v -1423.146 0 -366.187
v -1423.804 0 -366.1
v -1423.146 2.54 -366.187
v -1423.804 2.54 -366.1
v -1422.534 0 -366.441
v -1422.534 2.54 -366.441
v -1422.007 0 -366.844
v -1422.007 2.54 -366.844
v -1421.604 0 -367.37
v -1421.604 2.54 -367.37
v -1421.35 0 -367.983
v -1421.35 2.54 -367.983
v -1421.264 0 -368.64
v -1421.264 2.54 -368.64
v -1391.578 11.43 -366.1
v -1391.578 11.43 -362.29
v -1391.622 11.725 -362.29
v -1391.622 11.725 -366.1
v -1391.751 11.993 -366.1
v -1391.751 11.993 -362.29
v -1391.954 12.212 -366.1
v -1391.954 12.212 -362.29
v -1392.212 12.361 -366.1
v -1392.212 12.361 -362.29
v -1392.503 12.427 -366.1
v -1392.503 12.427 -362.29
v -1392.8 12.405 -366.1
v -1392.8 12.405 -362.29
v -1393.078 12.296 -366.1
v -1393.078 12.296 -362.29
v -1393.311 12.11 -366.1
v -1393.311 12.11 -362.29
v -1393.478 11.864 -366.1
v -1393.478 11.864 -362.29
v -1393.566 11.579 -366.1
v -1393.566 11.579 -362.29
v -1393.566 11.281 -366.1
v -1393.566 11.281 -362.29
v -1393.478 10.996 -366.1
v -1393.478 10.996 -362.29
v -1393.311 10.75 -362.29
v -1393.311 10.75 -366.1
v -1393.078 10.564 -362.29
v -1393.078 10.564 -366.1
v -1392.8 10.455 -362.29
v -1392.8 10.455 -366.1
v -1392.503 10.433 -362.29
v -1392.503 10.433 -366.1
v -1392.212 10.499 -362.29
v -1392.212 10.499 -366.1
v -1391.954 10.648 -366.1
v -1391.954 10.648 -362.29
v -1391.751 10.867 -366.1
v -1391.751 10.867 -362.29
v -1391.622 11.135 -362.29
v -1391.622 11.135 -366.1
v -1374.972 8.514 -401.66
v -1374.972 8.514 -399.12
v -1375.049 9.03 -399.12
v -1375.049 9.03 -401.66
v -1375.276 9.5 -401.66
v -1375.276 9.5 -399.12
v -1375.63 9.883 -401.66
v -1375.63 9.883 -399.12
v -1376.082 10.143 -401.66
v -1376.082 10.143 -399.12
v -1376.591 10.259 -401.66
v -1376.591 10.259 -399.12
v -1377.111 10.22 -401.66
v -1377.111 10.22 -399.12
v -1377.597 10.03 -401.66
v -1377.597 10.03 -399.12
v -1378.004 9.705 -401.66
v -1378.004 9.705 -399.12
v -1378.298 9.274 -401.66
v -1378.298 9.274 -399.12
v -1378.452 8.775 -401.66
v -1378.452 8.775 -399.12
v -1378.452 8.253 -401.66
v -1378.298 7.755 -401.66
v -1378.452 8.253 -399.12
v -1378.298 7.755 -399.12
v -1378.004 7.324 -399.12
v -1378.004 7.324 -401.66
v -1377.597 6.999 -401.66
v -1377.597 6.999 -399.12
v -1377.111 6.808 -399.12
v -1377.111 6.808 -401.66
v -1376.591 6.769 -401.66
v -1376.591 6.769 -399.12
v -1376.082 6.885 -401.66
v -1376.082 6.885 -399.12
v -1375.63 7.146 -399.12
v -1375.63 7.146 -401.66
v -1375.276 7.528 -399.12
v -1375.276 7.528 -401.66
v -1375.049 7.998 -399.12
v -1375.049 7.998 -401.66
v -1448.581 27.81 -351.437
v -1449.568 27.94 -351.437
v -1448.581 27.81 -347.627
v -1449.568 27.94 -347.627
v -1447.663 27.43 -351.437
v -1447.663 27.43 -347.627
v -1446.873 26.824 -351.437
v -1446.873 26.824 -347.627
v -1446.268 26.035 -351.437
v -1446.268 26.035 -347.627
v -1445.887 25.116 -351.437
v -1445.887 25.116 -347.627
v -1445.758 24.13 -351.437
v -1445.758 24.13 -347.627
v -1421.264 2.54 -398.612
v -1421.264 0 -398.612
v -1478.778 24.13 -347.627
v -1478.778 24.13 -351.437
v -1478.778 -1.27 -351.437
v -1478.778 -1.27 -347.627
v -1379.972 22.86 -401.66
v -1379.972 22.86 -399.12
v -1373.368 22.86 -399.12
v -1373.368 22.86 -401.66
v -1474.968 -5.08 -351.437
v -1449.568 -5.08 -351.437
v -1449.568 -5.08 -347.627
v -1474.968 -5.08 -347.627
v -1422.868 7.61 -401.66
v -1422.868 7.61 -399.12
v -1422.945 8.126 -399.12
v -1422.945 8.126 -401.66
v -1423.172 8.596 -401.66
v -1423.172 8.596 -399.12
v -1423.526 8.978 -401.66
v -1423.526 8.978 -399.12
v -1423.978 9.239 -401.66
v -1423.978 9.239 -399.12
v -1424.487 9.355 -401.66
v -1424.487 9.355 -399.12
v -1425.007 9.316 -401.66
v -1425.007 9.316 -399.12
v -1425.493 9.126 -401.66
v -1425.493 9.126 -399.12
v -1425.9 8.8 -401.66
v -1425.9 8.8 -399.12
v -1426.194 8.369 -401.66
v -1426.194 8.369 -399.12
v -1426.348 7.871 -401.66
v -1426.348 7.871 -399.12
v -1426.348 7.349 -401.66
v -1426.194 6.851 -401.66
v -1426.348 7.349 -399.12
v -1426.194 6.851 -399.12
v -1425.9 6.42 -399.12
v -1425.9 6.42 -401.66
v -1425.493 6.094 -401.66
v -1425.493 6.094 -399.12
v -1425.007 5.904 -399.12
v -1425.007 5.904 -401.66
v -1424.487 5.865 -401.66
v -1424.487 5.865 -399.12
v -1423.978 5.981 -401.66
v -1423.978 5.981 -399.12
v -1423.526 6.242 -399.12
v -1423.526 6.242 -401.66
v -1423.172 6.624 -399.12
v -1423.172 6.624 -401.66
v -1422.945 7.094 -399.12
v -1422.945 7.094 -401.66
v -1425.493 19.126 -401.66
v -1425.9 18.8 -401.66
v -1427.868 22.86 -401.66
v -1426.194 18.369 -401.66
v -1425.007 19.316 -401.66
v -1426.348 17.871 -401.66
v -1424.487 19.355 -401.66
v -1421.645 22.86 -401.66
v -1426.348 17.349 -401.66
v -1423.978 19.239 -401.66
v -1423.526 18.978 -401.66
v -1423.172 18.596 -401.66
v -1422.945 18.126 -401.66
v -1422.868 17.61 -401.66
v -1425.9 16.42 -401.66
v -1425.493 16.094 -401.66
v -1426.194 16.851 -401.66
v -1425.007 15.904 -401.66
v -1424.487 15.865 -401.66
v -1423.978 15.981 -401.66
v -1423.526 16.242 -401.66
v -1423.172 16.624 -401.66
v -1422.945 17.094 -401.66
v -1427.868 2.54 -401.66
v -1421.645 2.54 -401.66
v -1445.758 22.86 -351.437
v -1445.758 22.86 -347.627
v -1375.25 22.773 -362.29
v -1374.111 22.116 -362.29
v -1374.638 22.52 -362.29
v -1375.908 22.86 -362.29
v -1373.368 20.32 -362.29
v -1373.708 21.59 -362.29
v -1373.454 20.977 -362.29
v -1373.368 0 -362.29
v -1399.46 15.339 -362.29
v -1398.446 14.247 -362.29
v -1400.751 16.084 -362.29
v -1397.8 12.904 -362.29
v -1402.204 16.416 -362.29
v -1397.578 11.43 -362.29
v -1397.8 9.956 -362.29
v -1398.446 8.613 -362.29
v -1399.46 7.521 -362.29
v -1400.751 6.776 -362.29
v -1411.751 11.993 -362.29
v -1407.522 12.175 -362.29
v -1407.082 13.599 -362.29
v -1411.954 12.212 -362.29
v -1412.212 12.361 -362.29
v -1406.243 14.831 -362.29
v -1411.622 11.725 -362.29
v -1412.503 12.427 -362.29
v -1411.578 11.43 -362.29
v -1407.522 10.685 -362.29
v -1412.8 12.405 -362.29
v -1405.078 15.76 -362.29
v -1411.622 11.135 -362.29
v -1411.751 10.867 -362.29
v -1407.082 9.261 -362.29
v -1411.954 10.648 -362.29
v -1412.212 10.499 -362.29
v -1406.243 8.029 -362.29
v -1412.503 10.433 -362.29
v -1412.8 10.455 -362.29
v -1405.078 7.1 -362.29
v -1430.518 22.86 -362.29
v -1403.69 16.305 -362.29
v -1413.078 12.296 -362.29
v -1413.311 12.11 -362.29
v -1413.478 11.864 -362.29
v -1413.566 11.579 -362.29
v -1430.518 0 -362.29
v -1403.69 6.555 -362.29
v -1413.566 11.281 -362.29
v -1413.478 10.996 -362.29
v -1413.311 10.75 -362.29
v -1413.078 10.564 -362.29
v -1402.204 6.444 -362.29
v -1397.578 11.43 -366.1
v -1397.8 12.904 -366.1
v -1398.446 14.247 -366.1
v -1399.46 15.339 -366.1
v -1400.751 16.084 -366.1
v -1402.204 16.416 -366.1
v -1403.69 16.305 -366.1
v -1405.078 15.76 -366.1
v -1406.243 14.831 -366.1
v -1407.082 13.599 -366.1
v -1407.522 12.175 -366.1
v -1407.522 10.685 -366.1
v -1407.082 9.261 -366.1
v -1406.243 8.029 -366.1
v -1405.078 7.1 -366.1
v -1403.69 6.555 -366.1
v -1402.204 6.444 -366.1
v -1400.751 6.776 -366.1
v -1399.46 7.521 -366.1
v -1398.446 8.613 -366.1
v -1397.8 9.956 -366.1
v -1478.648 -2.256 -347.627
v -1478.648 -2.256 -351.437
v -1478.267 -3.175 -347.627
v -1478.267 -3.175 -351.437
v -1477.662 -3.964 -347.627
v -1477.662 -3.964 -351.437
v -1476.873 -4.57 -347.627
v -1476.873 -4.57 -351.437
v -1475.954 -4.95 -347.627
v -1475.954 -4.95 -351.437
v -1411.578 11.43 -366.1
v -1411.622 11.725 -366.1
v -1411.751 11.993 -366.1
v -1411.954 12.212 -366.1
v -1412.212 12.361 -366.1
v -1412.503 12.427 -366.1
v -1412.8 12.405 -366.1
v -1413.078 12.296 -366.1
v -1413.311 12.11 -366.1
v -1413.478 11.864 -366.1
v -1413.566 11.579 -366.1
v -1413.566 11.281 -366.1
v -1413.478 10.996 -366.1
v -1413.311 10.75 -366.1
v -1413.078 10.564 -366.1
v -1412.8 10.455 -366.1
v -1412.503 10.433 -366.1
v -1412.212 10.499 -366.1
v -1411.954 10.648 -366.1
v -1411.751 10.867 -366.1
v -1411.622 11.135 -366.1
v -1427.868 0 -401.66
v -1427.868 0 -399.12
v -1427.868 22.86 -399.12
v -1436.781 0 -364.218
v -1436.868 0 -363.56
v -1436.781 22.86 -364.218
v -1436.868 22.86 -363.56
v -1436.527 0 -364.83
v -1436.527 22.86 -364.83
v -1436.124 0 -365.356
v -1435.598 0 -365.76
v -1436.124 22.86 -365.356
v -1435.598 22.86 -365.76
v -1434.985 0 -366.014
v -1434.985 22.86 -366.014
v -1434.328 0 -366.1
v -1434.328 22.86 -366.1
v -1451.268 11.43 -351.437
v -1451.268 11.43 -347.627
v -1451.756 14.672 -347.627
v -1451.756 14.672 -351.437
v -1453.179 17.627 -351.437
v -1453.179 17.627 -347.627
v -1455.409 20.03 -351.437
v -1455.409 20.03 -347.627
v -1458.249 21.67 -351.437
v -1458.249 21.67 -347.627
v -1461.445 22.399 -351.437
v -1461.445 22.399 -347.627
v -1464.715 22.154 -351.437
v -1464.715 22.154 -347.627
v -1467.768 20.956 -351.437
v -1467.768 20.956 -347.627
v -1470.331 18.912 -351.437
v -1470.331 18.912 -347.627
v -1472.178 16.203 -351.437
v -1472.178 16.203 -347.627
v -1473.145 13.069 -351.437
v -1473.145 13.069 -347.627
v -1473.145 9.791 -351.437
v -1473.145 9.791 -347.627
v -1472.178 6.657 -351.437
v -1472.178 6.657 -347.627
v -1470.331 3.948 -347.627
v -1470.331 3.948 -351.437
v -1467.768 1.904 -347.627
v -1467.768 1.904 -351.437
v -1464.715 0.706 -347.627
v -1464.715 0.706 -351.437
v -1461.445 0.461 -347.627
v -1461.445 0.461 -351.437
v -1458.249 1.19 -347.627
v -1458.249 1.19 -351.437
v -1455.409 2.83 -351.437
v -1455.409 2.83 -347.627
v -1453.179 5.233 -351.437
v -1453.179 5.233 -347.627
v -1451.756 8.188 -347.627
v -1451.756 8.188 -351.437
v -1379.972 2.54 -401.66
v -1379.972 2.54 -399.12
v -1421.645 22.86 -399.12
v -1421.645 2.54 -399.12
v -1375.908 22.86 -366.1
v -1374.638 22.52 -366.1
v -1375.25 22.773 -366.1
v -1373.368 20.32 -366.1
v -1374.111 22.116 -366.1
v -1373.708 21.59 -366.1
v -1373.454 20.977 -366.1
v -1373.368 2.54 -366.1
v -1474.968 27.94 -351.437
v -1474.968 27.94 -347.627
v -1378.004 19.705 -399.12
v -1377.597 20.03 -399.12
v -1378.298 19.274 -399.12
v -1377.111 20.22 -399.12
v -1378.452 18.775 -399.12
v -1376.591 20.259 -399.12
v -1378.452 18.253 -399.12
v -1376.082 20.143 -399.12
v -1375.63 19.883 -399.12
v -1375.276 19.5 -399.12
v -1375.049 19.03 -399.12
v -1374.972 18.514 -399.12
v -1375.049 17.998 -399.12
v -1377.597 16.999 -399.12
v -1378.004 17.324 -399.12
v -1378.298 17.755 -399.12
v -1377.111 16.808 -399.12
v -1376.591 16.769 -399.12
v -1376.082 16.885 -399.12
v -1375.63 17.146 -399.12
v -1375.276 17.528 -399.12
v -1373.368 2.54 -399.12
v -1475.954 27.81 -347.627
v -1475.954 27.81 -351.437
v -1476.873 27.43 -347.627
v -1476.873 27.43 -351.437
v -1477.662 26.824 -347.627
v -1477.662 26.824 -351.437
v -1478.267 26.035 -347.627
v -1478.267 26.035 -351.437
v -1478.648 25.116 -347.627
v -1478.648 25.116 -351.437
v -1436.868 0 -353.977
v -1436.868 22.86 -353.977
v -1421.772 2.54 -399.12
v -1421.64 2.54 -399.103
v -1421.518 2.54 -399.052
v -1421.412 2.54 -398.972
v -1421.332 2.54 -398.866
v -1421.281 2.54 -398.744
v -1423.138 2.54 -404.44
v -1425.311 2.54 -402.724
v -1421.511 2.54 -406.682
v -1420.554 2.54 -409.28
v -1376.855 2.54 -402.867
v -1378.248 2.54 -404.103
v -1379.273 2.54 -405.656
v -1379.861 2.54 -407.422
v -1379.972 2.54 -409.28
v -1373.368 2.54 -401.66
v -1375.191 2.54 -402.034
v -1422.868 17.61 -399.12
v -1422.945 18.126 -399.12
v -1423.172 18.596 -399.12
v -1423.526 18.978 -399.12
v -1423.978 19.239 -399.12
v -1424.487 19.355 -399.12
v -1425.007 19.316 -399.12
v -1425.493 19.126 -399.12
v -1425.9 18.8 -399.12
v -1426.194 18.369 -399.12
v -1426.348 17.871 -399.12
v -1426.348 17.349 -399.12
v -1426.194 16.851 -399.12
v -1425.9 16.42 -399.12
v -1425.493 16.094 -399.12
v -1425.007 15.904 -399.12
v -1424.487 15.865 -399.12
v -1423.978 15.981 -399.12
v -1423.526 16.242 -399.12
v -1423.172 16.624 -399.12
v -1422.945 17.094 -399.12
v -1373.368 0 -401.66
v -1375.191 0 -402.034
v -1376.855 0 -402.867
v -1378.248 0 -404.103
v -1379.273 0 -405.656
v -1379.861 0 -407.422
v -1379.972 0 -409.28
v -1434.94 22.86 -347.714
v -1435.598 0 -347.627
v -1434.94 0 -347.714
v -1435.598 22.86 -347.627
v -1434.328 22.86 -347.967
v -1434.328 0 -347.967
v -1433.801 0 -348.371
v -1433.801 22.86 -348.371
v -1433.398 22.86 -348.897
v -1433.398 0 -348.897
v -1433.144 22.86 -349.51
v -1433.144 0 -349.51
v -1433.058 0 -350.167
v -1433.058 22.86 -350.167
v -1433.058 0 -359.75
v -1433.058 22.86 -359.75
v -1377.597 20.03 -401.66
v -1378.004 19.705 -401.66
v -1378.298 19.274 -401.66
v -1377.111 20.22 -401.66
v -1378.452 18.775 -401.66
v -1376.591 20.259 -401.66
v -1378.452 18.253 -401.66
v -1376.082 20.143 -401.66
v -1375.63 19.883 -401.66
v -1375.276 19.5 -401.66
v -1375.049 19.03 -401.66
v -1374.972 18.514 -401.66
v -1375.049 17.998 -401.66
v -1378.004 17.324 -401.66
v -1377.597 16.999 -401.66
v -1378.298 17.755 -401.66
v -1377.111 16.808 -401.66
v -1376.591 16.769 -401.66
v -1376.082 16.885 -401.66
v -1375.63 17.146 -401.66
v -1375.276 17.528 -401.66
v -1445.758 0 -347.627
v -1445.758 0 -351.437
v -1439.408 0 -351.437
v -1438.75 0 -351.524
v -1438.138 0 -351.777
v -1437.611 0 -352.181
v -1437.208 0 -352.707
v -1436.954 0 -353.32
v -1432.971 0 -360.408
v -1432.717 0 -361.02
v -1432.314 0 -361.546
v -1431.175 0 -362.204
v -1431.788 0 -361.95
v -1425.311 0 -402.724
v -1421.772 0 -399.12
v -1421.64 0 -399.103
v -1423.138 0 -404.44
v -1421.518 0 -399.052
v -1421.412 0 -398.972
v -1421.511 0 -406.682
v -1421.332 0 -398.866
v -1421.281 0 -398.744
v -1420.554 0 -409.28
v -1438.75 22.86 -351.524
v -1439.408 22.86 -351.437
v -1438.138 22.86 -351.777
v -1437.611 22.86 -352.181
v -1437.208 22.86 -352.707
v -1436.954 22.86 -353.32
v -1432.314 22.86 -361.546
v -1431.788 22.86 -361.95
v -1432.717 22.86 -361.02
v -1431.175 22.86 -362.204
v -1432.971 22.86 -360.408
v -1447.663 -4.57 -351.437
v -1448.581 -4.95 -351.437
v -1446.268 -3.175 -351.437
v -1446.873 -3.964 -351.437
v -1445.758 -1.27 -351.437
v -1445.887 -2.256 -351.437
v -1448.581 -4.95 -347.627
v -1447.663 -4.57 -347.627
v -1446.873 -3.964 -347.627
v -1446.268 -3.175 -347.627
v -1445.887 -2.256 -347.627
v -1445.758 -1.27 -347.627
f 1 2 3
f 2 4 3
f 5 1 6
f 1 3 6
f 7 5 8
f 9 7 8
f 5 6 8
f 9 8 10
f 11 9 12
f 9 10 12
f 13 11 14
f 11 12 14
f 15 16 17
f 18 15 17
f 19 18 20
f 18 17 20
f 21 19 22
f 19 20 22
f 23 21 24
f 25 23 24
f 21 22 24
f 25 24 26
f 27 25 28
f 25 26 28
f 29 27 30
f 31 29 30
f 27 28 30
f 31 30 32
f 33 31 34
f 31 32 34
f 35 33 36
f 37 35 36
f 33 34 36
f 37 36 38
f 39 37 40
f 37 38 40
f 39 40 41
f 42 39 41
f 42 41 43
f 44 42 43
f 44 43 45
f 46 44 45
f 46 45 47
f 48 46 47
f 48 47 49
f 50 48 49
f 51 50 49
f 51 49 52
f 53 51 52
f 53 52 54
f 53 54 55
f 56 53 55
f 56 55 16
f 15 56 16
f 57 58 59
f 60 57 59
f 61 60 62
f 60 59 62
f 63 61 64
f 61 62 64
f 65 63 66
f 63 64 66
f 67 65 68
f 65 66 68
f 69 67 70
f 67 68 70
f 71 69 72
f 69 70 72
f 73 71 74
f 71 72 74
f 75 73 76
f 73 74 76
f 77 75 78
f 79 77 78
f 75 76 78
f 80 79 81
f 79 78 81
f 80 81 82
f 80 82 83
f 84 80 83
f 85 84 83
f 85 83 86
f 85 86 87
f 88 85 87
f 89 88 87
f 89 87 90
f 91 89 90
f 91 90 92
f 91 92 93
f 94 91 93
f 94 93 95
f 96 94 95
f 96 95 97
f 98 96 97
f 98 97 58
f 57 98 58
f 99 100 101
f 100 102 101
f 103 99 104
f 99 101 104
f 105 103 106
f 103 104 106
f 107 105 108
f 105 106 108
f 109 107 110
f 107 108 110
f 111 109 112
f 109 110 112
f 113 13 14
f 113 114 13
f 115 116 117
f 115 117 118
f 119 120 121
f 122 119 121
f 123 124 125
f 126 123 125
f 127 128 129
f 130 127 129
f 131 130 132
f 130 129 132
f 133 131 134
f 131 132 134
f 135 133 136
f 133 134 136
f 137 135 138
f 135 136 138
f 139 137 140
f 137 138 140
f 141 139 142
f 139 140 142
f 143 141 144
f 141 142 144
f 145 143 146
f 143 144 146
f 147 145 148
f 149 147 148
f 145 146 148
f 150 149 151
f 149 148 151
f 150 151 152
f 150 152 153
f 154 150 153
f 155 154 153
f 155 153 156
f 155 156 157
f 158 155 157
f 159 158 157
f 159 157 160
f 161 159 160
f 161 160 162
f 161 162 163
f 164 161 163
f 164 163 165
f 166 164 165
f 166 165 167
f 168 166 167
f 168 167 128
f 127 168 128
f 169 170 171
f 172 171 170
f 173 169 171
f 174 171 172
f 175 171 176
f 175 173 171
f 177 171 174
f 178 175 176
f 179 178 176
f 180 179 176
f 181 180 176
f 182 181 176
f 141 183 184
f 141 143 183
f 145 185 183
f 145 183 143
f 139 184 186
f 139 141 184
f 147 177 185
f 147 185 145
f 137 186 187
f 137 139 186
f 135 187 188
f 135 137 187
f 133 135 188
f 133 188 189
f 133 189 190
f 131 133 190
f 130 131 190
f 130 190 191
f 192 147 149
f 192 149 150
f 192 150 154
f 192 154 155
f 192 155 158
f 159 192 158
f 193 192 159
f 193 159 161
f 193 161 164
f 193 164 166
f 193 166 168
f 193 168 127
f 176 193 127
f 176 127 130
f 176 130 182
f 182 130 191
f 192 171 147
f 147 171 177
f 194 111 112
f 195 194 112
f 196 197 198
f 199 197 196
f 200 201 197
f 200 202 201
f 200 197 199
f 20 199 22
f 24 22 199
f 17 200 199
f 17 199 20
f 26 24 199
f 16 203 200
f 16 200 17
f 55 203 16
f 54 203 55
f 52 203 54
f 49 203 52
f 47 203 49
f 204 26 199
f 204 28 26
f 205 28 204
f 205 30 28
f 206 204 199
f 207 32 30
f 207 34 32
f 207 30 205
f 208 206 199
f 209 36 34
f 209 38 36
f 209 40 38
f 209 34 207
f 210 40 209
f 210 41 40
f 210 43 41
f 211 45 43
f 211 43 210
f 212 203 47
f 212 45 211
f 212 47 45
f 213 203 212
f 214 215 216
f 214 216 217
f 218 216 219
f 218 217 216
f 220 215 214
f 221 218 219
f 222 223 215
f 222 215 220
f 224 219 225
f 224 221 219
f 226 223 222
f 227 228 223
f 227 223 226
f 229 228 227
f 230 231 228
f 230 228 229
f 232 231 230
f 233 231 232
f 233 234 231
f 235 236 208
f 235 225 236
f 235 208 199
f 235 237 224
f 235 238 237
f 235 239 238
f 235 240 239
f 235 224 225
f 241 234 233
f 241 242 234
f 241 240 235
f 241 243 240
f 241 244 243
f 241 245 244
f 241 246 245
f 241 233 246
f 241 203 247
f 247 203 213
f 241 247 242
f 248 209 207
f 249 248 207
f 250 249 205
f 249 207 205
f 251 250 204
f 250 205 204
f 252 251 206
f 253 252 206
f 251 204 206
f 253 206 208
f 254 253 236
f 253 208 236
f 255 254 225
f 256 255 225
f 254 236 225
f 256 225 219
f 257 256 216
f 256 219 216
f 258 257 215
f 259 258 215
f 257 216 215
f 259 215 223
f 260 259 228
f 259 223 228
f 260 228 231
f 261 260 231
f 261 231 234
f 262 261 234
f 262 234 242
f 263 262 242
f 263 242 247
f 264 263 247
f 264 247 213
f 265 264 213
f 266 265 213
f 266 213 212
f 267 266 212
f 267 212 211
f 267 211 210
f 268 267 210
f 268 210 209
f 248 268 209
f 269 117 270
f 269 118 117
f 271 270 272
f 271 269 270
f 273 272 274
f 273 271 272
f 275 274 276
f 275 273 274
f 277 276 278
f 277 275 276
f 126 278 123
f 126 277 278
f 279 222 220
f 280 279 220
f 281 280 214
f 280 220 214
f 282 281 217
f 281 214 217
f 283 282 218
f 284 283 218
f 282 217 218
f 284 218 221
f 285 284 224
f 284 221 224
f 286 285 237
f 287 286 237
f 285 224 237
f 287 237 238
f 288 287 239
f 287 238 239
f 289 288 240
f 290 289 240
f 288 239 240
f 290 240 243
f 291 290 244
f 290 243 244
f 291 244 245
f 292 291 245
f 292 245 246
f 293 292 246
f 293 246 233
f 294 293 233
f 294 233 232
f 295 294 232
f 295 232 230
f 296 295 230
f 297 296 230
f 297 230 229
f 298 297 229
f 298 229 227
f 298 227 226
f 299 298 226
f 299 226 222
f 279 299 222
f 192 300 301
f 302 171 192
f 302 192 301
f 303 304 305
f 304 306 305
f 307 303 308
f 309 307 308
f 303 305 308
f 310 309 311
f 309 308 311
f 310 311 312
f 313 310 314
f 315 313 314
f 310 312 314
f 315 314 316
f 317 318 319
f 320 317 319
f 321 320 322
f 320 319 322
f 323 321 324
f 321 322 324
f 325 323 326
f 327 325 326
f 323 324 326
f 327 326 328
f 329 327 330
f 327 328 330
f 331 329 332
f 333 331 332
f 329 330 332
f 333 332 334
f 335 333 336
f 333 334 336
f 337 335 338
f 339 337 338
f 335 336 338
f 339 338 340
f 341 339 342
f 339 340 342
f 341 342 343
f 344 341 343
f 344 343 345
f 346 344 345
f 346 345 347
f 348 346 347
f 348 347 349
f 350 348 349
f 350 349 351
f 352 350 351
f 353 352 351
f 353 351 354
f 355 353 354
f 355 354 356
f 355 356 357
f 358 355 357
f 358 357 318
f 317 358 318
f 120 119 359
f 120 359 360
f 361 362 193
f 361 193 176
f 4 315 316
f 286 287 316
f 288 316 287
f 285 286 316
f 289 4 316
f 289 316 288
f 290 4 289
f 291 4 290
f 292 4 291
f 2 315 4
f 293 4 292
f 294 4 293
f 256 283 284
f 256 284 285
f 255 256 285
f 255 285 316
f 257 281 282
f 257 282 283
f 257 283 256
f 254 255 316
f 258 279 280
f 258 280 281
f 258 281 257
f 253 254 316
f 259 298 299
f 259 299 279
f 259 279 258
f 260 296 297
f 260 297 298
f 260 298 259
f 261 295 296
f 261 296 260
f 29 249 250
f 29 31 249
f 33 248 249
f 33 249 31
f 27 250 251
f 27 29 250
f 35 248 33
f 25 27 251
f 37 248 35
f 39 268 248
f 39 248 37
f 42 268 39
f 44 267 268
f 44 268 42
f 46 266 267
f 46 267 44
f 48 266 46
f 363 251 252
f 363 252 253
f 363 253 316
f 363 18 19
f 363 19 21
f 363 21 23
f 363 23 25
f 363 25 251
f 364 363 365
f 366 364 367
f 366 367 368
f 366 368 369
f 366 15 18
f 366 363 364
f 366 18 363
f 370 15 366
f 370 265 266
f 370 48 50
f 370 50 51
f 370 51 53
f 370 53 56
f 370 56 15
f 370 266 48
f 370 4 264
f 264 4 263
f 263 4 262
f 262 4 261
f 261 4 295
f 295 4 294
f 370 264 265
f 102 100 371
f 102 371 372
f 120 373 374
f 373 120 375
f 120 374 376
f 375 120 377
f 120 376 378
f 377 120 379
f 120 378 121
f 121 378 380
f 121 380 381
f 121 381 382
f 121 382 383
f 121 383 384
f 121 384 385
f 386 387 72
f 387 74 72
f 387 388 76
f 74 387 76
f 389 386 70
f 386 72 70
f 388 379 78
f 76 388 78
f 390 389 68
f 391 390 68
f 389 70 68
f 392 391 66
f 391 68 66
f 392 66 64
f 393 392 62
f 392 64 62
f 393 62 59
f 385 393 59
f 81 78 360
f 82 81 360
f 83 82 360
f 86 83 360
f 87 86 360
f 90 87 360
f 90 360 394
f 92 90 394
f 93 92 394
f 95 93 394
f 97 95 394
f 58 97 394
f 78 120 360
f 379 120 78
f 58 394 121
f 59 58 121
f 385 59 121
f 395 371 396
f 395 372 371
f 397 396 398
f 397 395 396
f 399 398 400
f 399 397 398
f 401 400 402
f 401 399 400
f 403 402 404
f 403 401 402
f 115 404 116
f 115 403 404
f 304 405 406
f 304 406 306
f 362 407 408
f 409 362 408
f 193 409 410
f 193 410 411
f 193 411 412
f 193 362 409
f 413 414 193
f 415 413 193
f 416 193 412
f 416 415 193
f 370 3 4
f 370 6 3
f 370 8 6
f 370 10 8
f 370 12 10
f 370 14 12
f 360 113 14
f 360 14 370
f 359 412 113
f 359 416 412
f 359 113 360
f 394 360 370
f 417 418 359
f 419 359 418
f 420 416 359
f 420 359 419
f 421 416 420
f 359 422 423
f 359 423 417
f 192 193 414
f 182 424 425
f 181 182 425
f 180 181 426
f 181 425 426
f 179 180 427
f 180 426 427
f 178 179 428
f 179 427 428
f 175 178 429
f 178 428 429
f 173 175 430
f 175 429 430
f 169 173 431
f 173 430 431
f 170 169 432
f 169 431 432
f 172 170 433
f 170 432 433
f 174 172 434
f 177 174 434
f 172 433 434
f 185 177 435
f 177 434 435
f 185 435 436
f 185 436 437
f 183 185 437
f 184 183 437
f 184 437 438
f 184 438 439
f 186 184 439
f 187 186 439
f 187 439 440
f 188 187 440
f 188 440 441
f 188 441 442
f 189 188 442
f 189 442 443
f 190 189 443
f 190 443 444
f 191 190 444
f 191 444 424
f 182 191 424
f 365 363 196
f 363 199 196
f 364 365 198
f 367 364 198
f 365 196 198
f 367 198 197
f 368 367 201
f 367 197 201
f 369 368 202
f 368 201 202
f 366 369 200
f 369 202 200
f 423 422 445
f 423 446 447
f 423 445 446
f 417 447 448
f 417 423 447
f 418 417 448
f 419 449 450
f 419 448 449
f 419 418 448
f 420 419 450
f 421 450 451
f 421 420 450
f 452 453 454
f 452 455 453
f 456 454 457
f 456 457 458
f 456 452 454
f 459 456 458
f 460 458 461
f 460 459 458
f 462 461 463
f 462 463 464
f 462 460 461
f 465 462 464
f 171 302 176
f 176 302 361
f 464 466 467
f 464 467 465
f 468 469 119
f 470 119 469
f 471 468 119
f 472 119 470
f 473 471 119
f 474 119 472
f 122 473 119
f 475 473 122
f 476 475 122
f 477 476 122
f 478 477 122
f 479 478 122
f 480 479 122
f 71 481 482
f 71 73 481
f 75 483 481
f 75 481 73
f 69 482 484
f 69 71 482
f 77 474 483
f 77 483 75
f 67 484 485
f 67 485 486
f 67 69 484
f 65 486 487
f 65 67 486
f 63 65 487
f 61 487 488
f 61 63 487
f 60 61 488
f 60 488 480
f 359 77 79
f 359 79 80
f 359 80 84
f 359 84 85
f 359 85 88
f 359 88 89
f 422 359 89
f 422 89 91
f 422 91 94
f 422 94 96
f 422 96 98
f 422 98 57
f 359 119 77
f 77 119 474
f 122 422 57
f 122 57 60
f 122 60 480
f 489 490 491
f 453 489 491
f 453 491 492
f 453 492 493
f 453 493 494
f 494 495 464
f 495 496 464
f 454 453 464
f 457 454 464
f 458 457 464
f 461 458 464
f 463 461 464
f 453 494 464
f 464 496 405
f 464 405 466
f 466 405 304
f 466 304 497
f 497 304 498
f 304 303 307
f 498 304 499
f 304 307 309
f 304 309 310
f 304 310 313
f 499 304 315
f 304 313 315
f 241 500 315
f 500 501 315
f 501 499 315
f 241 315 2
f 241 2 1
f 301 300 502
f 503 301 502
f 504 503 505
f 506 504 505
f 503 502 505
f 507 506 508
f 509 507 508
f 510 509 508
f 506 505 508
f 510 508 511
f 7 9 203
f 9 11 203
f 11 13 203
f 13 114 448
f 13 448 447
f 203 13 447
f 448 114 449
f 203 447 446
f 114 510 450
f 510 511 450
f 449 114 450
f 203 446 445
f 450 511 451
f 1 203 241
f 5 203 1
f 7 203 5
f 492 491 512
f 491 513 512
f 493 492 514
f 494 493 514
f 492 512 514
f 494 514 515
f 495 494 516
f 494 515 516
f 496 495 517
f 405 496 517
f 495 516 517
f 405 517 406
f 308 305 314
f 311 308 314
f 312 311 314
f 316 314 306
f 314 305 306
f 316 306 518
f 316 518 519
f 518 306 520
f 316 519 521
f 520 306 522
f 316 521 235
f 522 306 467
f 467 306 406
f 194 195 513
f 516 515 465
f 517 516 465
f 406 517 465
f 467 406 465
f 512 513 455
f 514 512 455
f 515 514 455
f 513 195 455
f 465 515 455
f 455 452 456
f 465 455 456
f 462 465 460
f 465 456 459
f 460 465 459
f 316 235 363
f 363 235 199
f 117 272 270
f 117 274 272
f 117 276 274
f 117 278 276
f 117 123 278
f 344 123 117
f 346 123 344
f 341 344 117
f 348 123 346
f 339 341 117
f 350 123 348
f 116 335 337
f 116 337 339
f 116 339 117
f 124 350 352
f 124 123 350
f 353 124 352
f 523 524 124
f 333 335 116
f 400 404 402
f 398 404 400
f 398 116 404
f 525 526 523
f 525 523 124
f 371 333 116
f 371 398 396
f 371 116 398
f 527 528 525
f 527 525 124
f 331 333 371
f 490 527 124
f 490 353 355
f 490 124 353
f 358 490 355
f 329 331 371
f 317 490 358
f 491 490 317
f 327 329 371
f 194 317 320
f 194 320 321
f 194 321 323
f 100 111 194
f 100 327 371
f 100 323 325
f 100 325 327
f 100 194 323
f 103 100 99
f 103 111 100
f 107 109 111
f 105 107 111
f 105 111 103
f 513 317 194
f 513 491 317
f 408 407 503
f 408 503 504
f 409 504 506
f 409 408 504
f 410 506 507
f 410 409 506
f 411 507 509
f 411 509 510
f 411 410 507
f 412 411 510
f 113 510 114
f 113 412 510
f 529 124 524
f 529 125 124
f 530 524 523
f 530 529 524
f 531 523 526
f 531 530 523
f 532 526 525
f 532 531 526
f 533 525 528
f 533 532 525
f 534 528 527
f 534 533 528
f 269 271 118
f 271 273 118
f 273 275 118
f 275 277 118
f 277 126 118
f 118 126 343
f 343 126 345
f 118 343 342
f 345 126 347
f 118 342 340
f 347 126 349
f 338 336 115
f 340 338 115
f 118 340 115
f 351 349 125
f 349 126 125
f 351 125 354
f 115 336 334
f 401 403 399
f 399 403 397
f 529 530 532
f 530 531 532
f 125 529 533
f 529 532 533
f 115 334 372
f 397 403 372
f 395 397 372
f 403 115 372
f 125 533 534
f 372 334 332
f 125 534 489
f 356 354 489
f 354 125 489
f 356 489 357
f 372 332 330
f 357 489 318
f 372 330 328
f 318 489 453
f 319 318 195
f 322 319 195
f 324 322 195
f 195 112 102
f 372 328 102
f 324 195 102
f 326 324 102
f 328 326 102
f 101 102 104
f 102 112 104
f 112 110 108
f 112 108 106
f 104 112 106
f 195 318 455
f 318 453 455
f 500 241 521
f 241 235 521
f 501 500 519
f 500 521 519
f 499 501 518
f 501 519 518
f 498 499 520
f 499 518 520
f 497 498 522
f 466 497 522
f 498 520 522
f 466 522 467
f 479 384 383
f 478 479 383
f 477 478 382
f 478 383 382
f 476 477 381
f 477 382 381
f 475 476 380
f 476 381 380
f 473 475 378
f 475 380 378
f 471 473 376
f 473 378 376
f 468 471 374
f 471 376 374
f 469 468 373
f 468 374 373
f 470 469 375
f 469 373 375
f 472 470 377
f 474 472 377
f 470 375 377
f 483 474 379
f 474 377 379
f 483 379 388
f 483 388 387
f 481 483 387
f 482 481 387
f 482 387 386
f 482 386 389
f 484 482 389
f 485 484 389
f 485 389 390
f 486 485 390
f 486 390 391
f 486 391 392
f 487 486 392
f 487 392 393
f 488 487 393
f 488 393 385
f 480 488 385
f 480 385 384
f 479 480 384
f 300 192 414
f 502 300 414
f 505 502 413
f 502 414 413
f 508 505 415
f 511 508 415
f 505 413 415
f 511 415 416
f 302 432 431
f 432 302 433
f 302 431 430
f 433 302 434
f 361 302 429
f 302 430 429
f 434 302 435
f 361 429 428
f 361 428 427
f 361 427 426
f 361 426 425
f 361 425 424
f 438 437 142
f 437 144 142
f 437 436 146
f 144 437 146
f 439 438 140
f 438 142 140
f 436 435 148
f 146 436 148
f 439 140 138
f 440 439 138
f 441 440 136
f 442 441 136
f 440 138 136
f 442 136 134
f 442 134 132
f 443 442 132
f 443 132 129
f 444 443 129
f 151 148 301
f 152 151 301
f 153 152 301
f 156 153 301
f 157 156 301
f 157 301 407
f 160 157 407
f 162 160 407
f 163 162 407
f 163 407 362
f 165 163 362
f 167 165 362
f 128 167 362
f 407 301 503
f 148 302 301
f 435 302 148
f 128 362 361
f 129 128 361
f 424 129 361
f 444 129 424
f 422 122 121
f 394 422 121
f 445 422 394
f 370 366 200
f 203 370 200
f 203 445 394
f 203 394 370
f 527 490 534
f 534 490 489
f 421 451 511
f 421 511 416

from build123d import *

# Parameters (mm, degrees)
SKETCH2_W            = 47.895999966
SKETCH2_H            = 27.94
BOSS_EXTRUDE1_DEPTH  = 2.54
SKETCH4_W            = 6.604
SKETCH4_H            = 2.54
BOSS_EXTRUDE7_DEPTH  = 22.86
SKETCH22_W           = 41.291999966
SKETCH22_H           = 2.54
BOSS_EXTRUDE9_DEPTH  = 10.16
SKETCH23_W           = 7.62
SKETCH23_H           = 2.54
BOSS_EXTRUDE10_DEPTH = 6.604
SKETCH24_W           = 7.62
SKETCH24_H           = 2.54
BOSS_EXTRUDE11_DEPTH = 6.604
CUT_EXTRUDE2_DEPTH   = 6.604
SKETCH26_R           = 1.75
CUT_EXTRUDE3_DEPTH   = 6.604
SKETCH28_W           = 0.381
SKETCH28_H           = 20.32
CUT_EXTRUDE4_DEPTH   = 6.604
SKETCH29_W           = 47.895999966
SKETCH29_H           = 2.54
BOSS_EXTRUDE12_DEPTH = 5.08
SKETCH31_W           = 3.81
SKETCH31_H           = 10.853375152
BOSS_EXTRUDE13_DEPTH = 22.86
SKETCH32_W           = 3.81
SKETCH32_H           = 33.02
BOSS_EXTRUDE14_DEPTH = 33.02
SKETCH33_R           = 5
SKETCH33_R_2         = 1
CUT_EXTRUDE5_DEPTH   = 9.144
SKETCH34_R           = 11
CUT_EXTRUDE6_DEPTH   = 9.144
FILLET6_R            = 2.54
FILLET7_R            = 3.81
BOSS_EXTRUDE15_DEPTH = 2.54


with BuildPart() as part:
    # Sketch2 → Boss-Extrude1 (new body)
    with BuildSketch(Plane(origin=(0, 0, 0), x_dir=(1, 0, 0), z_dir=(0, 1, 0))):
        with Locations((-1397.315525756, 385.150412371)):
            Rectangle(SKETCH2_W, SKETCH2_H)
    extrude(amount=BOSS_EXTRUDE1_DEPTH)

    # Sketch4 → Boss-Extrude7 (add)
    with BuildSketch(Plane.XZ):
        with Locations((-1424.565525739, -400.390412371)):
            Rectangle(SKETCH4_W, SKETCH4_H)
        with Locations((-1376.669525773, -400.390412371)):
            Rectangle(SKETCH4_W, SKETCH4_H)
    extrude(amount=-BOSS_EXTRUDE7_DEPTH)


with BuildPart() as boss_extrude7_piece_1:
    # of the separate pieces the step leaves, piece 1, a body of its own (boss_extrude7_pieces)
    add(part.part.solids().sort_by_distance((-1379.971525773, 0, -399.120412371))[0])



with BuildPart() as boss_extrude7_piece_2:
    # of the separate pieces the step leaves, piece 2, a body of its own (boss_extrude7_pieces)
    add(part.part.solids().sort_by_distance((-1421.263525739, 22.86, -399.120412371))[0])


with BuildPart() as boss_extrude7_piece_1_1:
    add(boss_extrude7_piece_1.part)

    add(boss_extrude7_piece_2.part)  # Boss-Extrude9 merges Boss-Extrude7 piece 2
    # Sketch22 → Boss-Extrude9 (add)
    with BuildSketch(Plane(origin=(0, 0, -399.120412371), x_dir=(-1, 0, 0), z_dir=(0, 0, -1))):
        with Locations((1400.617525756, 1.27)):
            Rectangle(SKETCH22_W, SKETCH22_H)
    extrude(amount=BOSS_EXTRUDE9_DEPTH)

    # Sketch23 → Boss-Extrude10 (add)
    with BuildSketch(Plane(origin=(-1379.971525773, 0, 0), x_dir=(0, 0, -1), z_dir=(1, 0, 0))):
        with Locations((405.470412371, 1.27)):
            Rectangle(SKETCH23_W, SKETCH23_H)
    extrude(amount=BOSS_EXTRUDE10_DEPTH)

    # Sketch24 → Boss-Extrude11 (add)
    with BuildSketch(Plane.ZY.offset(1421.263525739)):
        with Locations((-405.470412371, 1.27)):
            Rectangle(SKETCH24_W, SKETCH24_H)
    extrude(amount=BOSS_EXTRUDE11_DEPTH)

    # Sketch25 → Cut-Extrude2 (cut)
    with BuildSketch(Plane(origin=(0, 2.54, 0), x_dir=(1, 0, 0), z_dir=(0, 1, 0))):
        with BuildLine():
            Line((-1420.553753649, 409.280412371), (-1427.867525739, 409.280412371))
            Line((-1427.867525739, 409.280412371), (-1427.867525739, 401.660412371))
            ThreePointArc((-1427.867525739, 401.660412371), (-1423.137532321, 404.440430382), (-1420.553753649, 409.280412371))
        make_face()
        with BuildLine():
            Line((-1379.971525773, 409.280412371), (-1373.367525773, 409.280412371))
            Line((-1373.367525773, 409.280412371), (-1373.367525773, 401.660412371))
            ThreePointArc((-1373.367525773, 401.660412371), (-1378.247679446, 404.102679188), (-1379.971525773, 409.280412371))
        make_face()
    extrude(amount=-CUT_EXTRUDE2_DEPTH, mode=Mode.SUBTRACT)

    # Sketch26 → Cut-Extrude3 (cut)
    with BuildSketch(Plane.XY.offset(-399.120412371)):
        with Locations((-1424.617525739, 17.61)):
            Circle(SKETCH26_R)
        with Locations((-1424.617525739, 7.61)):
            Circle(SKETCH26_R)
        with Locations((-1376.721525773, 18.514296447)):
            Circle(SKETCH26_R)
        with Locations((-1376.721525773, 8.514296447)):
            Circle(SKETCH26_R)
    extrude(amount=-CUT_EXTRUDE3_DEPTH, mode=Mode.SUBTRACT)

    # Sketch28 → Cut-Extrude4 (cut)
    with BuildSketch(Plane.XY.offset(-399.120412371)):
        with Locations((-1421.454025739, 12.7)):
            Rectangle(SKETCH28_W, SKETCH28_H)
    extrude(amount=-CUT_EXTRUDE4_DEPTH, mode=Mode.SUBTRACT)

    # Sketch29 → Boss-Extrude12 (add)
    with BuildSketch(Plane.XY.offset(-371.180412371)):
        with Locations((-1397.315525756, 1.27)):
            Rectangle(SKETCH29_W, SKETCH29_H)
    extrude(amount=BOSS_EXTRUDE12_DEPTH)

    # Sketch31 → Boss-Extrude13 (add)
    with BuildSketch(Plane.XZ):
        Polygon((-1421.263525739, -366.100412371), (-1373.367525773, -366.100412371), (-1373.367525773, -362.290412371), (-1433.057525773, -362.290412371), (-1436.867525773, -362.290412371), (-1436.867525773, -366.100412371), align=None)
        with Locations((-1434.962525773, -356.863724795)):
            Rectangle(SKETCH31_W, SKETCH31_H)
        Polygon((-1436.867525773, -351.437037219), (-1433.057525773, -351.437037219), (-1433.057525773, -347.627037219), (-1445.757525773, -347.627037219), (-1445.757525773, -351.437037219), align=None)
    extrude(amount=-BOSS_EXTRUDE13_DEPTH)

    # Sketch32 → Boss-Extrude14 (add)
    with BuildSketch(Plane.ZY.offset(1445.757525773)):
        with Locations((-349.532037219, 11.43)):
            Rectangle(SKETCH32_W, SKETCH32_H)
    extrude(amount=BOSS_EXTRUDE14_DEPTH)

    # Sketch33 → Cut-Extrude5 (cut)
    with BuildSketch(Plane.XY.offset(-362.290412371)):
        with Locations((-1402.577525773, 11.43)):
            Circle(SKETCH33_R)
        with Locations((-1412.577525773, 11.43)):
            Circle(SKETCH33_R_2)
        with Locations((-1392.577525773, 11.43)):
            Circle(SKETCH33_R_2)
    extrude(amount=-CUT_EXTRUDE5_DEPTH, mode=Mode.SUBTRACT)

    # Sketch34 → Cut-Extrude6 (cut)
    with BuildSketch(Plane.XY.offset(-347.627037219)):
        with Locations((-1462.267525773, 11.43)):
            Circle(SKETCH34_R)
    extrude(amount=-CUT_EXTRUDE6_DEPTH, mode=Mode.SUBTRACT)

    # Fillet6
    fillet6_edges = [boss_extrude7_piece_1_1.edges().sort_by_distance(p)[0] for p in [
        (-1421.263525739, 1.27, -366.100412371),
        (-1436.867525773, 11.43, -366.100412371),
        (-1436.867525773, 11.43, -351.437037219),
        (-1433.057525773, 11.43, -347.627037219),
        (-1433.057525773, 11.43, -362.290412371),
        (-1373.367525773, 22.86, -364.195412371),
    ]]
    fillet(fillet6_edges, radius=FILLET6_R)

    # Fillet7
    fillet7_edges = [boss_extrude7_piece_1_1.edges().sort_by_distance(p)[0] for p in [
        (-1445.757525773, -5.08, -349.532037219),
        (-1445.757525773, 27.94, -349.532037219),
        (-1478.777525773, -5.08, -349.532037219),
        (-1478.777525773, 27.94, -349.532037219),
    ]]
    fillet(fillet7_edges, radius=FILLET7_R)

    # Sketch35 → Boss-Extrude15 (add)
    with BuildSketch(Plane(origin=(0, 2.54, 0), x_dir=(1, 0, 0), z_dir=(0, 1, 0))):
        with BuildLine():
            Line((-1421.263525739, 399.120412371), (-1421.771525739, 399.120412371))
            ThreePointArc((-1421.771525739, 399.120412371), (-1421.412315494, 398.971622616), (-1421.263525739, 398.612412371))
            Line((-1421.263525739, 398.612412371), (-1421.263525739, 399.120412371))
        make_face()
    extrude(amount=-BOSS_EXTRUDE15_DEPTH)


solid = boss_extrude7_piece_1_1.part
